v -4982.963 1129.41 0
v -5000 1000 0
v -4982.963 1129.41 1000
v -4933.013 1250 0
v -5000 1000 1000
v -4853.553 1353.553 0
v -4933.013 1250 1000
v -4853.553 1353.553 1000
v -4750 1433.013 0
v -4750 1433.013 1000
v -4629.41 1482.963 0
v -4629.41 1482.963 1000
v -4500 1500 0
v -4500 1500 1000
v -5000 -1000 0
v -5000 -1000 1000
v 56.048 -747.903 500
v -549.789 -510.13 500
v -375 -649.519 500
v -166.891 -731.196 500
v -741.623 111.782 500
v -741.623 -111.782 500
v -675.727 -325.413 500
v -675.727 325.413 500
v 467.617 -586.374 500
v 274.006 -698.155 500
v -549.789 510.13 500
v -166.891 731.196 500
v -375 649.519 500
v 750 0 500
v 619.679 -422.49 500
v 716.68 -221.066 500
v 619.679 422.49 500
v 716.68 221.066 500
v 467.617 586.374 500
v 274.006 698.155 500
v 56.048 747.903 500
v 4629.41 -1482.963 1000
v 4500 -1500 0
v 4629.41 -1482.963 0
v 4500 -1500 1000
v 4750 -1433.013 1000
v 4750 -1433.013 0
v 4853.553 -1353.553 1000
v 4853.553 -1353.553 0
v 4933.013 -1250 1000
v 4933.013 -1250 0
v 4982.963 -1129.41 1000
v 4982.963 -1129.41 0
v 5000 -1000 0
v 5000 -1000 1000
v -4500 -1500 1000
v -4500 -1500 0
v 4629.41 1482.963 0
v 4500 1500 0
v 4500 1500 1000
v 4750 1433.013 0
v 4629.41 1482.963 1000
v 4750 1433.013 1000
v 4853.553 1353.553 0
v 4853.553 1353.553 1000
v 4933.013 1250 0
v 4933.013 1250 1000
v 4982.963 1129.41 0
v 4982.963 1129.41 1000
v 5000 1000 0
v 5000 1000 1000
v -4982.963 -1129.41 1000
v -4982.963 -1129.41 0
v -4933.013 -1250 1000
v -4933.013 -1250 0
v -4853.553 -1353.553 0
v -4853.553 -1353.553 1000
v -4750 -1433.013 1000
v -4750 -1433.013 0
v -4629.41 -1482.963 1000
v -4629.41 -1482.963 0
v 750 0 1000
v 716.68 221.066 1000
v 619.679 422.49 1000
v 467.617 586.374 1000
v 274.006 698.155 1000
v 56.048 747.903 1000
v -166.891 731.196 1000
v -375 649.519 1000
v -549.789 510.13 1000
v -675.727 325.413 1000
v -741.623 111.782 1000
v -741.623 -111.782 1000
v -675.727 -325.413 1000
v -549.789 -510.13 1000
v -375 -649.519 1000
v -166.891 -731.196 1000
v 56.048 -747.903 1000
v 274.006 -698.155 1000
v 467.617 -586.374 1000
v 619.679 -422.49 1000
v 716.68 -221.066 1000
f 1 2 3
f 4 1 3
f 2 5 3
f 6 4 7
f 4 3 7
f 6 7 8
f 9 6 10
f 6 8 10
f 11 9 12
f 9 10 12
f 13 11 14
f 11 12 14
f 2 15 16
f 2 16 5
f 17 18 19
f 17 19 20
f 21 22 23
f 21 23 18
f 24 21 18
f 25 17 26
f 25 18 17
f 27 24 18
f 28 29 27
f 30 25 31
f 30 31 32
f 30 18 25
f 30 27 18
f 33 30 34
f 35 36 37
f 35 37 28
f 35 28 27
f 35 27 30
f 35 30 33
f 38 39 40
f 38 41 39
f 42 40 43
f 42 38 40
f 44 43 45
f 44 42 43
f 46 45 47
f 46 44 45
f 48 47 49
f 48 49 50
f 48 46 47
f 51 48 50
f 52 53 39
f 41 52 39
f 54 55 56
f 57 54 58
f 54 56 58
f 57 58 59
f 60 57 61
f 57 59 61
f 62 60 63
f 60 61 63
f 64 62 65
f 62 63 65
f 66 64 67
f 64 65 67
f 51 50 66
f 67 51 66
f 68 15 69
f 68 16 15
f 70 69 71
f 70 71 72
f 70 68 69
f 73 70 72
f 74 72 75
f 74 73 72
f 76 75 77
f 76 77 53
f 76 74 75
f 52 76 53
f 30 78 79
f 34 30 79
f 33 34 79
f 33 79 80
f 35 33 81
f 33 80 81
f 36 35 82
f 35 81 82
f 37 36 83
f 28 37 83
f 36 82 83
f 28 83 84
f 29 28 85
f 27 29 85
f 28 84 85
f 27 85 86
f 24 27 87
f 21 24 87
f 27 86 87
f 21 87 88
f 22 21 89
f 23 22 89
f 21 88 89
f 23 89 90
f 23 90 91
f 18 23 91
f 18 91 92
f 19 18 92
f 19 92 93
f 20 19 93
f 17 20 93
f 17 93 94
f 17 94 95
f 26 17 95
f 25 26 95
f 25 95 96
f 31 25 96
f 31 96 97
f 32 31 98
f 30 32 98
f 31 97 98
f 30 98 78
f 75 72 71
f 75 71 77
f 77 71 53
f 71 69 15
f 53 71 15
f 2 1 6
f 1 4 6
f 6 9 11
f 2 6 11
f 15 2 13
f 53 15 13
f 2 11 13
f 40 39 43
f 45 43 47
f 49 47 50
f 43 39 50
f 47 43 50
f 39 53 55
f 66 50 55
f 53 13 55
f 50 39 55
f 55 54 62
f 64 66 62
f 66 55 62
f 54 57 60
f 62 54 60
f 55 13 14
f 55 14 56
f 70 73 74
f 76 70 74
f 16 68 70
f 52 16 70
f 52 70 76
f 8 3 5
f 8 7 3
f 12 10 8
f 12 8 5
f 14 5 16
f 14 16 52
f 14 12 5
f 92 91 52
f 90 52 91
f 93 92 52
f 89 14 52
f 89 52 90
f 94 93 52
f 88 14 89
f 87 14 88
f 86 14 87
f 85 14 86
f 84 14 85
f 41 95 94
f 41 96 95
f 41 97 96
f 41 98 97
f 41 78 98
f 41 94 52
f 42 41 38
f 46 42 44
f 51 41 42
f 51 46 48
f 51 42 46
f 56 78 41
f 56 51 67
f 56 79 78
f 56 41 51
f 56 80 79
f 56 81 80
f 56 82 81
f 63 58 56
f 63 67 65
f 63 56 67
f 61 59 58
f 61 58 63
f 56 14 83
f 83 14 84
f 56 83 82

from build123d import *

# Parameters (mm, degrees)
SKETCH1_W           = 10000
SKETCH1_H           = 3000
BOSS_EXTRUDE1_DEPTH = 1000
FILLET1_R           = 500
FILLET2_R           = 500
SKETCH3_R           = 750
CUT_EXTRUDE2_DEPTH  = 500


with BuildPart() as part:
    # Sketch1 → Boss-Extrude1 (new body)
    with BuildSketch(Plane.XY):
        Rectangle(SKETCH1_W, SKETCH1_H)
    extrude(amount=BOSS_EXTRUDE1_DEPTH)

    # Fillet1
    fillet1_edges = [part.edges().sort_by_distance(p)[0] for p in [
        (-5000, 1500, 500),
    ]]
    fillet(fillet1_edges, radius=FILLET1_R)

    # Fillet2
    fillet2_edges = [part.edges().sort_by_distance(p)[0] for p in [
        (5000, -1500, 500),
        (-5000, -1500, 500),
        (5000, 1500, 500),
    ]]
    fillet(fillet2_edges, radius=FILLET2_R)

    # Sketch3 → Cut-Extrude2 (cut)
    with BuildSketch(Plane.XY.offset(1000)):
        Circle(SKETCH3_R)
    extrude(amount=-CUT_EXTRUDE2_DEPTH, mode=Mode.SUBTRACT)


solid = part.part
